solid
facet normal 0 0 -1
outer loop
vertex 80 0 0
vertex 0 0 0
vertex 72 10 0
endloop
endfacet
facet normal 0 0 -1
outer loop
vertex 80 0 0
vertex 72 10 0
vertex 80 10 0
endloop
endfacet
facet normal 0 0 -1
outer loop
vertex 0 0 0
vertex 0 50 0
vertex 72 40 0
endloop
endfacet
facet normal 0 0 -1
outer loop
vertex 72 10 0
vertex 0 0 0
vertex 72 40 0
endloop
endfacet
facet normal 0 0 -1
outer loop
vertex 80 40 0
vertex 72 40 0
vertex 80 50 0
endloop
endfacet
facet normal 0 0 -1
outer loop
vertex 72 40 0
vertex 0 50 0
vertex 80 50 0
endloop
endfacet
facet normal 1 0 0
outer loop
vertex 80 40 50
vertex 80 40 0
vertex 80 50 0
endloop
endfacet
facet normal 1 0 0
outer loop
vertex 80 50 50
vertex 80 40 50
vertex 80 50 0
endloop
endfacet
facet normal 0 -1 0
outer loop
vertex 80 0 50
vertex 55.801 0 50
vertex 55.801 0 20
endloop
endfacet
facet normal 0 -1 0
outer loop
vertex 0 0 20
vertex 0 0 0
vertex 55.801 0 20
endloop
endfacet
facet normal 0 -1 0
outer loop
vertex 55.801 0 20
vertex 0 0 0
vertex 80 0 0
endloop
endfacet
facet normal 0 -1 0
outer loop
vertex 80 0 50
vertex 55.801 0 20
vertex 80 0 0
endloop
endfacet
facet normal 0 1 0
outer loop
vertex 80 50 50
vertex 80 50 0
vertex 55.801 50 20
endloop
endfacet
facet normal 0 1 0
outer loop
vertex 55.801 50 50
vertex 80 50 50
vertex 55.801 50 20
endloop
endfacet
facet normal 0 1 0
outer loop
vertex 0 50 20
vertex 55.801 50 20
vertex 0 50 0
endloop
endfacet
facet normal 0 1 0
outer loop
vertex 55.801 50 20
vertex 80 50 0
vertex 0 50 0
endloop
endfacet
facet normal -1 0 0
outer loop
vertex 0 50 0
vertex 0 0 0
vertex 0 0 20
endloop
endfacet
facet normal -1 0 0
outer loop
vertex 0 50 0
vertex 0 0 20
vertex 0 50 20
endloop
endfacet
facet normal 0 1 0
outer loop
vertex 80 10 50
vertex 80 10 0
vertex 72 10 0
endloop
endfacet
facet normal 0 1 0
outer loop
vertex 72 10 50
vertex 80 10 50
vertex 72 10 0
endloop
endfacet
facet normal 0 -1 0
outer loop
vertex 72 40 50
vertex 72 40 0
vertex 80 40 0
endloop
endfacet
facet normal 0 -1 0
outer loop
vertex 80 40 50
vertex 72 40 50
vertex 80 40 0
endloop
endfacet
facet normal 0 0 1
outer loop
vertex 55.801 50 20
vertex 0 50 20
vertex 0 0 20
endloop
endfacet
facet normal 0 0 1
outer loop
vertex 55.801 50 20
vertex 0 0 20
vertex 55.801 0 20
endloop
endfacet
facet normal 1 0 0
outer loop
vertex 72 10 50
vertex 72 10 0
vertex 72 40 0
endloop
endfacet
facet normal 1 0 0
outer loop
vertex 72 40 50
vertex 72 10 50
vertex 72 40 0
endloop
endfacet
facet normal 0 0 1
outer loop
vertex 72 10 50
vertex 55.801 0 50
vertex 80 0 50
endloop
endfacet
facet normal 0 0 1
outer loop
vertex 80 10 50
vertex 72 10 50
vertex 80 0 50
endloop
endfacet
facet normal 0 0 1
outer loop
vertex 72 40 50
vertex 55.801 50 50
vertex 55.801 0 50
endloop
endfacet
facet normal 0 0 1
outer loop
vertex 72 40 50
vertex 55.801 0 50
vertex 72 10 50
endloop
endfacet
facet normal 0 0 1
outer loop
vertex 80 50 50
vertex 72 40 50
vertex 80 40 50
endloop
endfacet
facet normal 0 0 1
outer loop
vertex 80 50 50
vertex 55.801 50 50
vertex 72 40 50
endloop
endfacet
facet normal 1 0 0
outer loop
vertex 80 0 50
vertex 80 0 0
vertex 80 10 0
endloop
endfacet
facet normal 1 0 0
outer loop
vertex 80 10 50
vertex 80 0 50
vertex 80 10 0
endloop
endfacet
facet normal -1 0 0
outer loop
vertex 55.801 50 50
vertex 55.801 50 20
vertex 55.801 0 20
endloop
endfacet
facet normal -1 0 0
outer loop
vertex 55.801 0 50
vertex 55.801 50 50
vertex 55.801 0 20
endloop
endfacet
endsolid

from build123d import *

# Parameters (mm, degrees)
F0_W     = 55.8011086538
F0_H     = 50
F1_DEPTH = 20
F2_DEPTH = 50


with BuildPart() as f1:
    # F0 (on Top) → F1 (new body)
    with BuildSketch(Plane.XY):
        with Locations((27.9005543269, 25)):
            Rectangle(F0_W, F0_H)
    extrude(amount=F1_DEPTH)

    # F0 (on Top) → F2 (join)
    with BuildSketch(Plane.XY):
        Polygon((55.8011086538, 50), (55.8011086538, 0), (80, 0), (80, 10), (72, 10), (72, 40), (80, 40), (80, 50), align=None)
    extrude(amount=F2_DEPTH)


solid = f1.part
